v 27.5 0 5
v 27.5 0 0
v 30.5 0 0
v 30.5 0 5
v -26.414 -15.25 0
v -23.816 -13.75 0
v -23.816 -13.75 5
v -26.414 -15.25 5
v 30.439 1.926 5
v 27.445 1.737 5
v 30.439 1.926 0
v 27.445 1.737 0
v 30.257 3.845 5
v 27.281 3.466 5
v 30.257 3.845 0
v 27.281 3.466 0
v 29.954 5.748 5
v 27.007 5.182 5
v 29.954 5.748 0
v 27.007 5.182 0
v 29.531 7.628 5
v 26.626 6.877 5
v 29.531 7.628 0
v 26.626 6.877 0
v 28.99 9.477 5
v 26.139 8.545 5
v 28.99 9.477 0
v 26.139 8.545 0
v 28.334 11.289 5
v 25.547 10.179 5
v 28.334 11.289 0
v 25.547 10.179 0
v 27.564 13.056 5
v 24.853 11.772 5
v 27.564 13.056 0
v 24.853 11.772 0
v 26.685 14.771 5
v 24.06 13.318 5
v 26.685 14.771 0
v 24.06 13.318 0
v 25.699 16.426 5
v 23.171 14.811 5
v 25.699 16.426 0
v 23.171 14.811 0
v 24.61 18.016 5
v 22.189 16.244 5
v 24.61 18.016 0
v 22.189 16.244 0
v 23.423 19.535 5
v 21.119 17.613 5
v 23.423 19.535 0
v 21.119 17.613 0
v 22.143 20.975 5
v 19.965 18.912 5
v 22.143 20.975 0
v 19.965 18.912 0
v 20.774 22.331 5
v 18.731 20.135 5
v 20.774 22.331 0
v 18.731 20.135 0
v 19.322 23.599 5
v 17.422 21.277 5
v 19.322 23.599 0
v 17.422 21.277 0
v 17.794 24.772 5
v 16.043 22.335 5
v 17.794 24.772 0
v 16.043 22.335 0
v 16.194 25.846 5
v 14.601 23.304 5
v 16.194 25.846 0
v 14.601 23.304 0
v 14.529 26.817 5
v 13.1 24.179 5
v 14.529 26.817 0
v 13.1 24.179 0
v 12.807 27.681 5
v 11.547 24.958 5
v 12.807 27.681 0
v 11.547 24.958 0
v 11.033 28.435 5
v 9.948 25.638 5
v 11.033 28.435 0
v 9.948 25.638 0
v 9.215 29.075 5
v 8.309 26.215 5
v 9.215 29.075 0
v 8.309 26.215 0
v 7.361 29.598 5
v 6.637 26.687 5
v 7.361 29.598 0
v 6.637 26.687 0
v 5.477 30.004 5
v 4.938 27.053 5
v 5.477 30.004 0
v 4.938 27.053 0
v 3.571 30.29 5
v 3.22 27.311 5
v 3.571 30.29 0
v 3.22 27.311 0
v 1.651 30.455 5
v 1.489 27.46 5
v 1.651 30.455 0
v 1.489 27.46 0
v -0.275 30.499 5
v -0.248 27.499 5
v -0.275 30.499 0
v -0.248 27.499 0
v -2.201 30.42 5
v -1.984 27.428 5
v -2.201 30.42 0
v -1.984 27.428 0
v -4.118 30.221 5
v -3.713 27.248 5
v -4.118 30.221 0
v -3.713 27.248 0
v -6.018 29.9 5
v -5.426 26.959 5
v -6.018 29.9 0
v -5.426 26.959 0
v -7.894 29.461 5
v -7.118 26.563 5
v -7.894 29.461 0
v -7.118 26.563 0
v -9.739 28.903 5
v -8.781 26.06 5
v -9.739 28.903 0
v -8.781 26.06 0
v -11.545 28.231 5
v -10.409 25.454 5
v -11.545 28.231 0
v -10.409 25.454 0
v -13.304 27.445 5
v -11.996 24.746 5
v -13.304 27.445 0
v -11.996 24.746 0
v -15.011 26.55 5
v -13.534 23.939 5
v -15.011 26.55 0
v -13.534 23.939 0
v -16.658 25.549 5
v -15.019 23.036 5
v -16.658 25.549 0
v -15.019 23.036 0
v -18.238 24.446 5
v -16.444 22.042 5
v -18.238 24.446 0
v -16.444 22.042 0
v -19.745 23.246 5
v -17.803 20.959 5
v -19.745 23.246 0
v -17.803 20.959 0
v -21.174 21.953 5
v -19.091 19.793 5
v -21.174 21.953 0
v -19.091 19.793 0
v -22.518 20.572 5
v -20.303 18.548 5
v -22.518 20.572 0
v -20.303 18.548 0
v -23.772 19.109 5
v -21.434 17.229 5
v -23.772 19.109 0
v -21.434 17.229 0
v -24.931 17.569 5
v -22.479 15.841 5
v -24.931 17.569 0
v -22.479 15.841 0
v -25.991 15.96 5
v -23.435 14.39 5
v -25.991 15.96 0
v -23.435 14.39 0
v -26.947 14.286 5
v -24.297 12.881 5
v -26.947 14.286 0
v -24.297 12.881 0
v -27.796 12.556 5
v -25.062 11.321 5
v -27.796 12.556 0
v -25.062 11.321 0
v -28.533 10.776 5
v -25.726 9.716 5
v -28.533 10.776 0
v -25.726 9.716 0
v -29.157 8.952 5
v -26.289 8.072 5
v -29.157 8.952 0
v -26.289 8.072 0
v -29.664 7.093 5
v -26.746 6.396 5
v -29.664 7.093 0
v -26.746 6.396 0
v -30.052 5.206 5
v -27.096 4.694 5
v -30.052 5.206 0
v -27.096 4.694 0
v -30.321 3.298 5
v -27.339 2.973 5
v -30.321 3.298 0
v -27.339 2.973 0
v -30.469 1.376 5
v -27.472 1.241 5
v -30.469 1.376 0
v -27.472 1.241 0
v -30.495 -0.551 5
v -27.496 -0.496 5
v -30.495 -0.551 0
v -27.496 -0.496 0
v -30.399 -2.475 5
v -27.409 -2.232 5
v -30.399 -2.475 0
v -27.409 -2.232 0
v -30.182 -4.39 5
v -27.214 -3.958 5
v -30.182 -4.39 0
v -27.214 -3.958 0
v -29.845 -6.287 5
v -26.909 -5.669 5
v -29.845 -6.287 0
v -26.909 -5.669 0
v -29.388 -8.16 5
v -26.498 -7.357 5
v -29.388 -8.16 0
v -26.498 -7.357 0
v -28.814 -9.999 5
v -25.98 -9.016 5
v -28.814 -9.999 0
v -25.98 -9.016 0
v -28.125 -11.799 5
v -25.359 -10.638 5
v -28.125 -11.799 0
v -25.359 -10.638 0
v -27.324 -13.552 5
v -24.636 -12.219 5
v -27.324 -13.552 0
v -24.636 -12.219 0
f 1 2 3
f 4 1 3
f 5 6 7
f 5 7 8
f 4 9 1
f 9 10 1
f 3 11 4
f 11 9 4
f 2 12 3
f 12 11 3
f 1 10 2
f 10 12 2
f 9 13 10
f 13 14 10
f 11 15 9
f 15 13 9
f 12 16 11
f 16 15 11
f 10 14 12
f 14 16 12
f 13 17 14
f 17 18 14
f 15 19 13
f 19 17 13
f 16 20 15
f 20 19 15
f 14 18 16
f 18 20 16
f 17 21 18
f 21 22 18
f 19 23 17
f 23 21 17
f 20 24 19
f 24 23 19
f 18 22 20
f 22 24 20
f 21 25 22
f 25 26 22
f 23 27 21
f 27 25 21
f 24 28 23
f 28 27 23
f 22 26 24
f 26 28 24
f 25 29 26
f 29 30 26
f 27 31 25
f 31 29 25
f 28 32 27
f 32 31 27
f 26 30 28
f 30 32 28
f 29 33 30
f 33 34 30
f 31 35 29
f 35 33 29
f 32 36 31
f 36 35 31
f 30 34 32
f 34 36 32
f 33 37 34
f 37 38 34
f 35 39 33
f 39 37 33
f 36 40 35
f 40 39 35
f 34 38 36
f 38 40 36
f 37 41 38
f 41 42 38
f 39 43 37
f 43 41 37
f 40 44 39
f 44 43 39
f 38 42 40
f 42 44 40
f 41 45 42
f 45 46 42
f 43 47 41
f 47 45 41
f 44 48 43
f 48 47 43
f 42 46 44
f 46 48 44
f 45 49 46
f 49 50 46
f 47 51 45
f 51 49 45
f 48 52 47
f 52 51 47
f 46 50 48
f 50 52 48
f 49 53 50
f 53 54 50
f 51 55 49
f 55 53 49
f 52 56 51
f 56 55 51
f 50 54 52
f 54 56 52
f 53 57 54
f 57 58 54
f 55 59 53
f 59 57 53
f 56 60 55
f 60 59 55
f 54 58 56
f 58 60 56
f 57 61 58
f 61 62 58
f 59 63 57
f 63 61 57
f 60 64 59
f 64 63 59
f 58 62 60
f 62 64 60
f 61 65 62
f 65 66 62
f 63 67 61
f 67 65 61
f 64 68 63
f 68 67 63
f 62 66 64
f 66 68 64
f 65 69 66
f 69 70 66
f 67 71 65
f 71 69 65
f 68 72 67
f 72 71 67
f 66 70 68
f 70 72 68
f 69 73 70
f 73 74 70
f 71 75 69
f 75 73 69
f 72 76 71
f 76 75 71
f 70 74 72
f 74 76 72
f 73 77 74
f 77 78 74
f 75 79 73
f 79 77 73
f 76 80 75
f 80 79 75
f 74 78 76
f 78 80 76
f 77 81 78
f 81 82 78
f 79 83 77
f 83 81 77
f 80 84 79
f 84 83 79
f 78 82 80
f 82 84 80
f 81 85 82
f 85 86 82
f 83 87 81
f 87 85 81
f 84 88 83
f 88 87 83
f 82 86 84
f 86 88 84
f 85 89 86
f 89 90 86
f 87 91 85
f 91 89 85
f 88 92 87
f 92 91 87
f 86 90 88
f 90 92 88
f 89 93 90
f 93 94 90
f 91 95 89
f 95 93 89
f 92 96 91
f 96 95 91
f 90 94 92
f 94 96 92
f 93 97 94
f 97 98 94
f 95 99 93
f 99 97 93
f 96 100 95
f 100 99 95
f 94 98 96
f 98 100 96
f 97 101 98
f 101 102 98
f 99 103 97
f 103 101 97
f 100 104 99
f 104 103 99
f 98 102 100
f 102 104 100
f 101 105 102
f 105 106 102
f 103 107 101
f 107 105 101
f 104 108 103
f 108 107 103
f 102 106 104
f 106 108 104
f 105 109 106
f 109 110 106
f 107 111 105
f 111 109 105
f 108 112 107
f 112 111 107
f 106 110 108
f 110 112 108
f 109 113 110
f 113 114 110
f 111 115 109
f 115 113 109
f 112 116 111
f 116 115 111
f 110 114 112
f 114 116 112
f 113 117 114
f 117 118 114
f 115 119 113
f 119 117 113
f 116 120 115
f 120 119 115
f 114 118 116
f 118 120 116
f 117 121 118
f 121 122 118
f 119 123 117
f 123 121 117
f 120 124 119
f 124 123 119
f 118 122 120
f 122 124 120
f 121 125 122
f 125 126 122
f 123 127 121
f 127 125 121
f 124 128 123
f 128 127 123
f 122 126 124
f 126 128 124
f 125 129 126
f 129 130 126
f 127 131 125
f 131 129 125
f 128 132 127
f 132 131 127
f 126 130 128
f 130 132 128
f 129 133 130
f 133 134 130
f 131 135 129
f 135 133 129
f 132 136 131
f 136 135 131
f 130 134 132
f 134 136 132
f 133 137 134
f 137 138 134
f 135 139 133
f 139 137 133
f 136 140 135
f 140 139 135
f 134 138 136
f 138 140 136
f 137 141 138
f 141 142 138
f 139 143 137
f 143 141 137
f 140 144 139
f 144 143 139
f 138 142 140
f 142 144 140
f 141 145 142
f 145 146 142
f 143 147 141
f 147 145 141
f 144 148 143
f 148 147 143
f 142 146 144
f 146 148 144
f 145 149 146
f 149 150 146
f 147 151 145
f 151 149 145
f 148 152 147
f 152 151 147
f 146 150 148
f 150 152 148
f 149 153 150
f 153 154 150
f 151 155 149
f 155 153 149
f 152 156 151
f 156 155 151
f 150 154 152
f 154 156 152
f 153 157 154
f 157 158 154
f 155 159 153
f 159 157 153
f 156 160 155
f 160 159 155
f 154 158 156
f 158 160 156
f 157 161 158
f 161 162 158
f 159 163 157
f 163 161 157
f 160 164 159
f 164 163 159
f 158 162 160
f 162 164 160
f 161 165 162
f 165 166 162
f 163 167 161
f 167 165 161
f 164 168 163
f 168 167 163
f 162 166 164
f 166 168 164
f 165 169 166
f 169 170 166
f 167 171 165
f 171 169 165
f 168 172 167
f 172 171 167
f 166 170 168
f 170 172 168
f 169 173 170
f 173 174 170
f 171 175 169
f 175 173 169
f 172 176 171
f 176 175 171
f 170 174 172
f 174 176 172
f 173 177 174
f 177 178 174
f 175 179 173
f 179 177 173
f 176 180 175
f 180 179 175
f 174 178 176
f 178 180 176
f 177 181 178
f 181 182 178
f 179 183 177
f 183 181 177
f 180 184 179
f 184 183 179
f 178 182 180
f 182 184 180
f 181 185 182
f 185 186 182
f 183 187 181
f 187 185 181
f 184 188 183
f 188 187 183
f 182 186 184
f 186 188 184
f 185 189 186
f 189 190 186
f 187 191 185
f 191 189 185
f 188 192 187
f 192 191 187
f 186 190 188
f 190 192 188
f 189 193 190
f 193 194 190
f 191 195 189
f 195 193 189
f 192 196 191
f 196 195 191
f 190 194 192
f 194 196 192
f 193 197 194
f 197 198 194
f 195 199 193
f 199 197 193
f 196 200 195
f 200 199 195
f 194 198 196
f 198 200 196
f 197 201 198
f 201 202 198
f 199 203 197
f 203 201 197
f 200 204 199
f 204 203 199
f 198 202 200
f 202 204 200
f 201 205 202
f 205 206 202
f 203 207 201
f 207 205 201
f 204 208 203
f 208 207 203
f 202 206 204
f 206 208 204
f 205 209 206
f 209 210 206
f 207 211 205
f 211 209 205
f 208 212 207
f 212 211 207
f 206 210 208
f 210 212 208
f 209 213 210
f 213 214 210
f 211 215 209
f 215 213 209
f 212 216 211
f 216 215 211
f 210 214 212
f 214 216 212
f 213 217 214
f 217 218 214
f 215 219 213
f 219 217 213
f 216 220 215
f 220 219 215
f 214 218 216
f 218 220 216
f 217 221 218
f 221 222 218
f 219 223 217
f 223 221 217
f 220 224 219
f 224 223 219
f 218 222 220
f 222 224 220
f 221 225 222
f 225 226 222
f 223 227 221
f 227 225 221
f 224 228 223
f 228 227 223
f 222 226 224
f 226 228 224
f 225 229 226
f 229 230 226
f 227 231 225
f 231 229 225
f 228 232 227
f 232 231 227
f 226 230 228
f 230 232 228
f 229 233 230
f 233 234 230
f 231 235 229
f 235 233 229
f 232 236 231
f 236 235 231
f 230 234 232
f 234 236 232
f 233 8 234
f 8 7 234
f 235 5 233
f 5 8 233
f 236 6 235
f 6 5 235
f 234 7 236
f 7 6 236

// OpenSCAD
rotate_extrude($fn=100, convexity = 2, angle=210) translate([55/2, 0, 0]) square([3,5]);
